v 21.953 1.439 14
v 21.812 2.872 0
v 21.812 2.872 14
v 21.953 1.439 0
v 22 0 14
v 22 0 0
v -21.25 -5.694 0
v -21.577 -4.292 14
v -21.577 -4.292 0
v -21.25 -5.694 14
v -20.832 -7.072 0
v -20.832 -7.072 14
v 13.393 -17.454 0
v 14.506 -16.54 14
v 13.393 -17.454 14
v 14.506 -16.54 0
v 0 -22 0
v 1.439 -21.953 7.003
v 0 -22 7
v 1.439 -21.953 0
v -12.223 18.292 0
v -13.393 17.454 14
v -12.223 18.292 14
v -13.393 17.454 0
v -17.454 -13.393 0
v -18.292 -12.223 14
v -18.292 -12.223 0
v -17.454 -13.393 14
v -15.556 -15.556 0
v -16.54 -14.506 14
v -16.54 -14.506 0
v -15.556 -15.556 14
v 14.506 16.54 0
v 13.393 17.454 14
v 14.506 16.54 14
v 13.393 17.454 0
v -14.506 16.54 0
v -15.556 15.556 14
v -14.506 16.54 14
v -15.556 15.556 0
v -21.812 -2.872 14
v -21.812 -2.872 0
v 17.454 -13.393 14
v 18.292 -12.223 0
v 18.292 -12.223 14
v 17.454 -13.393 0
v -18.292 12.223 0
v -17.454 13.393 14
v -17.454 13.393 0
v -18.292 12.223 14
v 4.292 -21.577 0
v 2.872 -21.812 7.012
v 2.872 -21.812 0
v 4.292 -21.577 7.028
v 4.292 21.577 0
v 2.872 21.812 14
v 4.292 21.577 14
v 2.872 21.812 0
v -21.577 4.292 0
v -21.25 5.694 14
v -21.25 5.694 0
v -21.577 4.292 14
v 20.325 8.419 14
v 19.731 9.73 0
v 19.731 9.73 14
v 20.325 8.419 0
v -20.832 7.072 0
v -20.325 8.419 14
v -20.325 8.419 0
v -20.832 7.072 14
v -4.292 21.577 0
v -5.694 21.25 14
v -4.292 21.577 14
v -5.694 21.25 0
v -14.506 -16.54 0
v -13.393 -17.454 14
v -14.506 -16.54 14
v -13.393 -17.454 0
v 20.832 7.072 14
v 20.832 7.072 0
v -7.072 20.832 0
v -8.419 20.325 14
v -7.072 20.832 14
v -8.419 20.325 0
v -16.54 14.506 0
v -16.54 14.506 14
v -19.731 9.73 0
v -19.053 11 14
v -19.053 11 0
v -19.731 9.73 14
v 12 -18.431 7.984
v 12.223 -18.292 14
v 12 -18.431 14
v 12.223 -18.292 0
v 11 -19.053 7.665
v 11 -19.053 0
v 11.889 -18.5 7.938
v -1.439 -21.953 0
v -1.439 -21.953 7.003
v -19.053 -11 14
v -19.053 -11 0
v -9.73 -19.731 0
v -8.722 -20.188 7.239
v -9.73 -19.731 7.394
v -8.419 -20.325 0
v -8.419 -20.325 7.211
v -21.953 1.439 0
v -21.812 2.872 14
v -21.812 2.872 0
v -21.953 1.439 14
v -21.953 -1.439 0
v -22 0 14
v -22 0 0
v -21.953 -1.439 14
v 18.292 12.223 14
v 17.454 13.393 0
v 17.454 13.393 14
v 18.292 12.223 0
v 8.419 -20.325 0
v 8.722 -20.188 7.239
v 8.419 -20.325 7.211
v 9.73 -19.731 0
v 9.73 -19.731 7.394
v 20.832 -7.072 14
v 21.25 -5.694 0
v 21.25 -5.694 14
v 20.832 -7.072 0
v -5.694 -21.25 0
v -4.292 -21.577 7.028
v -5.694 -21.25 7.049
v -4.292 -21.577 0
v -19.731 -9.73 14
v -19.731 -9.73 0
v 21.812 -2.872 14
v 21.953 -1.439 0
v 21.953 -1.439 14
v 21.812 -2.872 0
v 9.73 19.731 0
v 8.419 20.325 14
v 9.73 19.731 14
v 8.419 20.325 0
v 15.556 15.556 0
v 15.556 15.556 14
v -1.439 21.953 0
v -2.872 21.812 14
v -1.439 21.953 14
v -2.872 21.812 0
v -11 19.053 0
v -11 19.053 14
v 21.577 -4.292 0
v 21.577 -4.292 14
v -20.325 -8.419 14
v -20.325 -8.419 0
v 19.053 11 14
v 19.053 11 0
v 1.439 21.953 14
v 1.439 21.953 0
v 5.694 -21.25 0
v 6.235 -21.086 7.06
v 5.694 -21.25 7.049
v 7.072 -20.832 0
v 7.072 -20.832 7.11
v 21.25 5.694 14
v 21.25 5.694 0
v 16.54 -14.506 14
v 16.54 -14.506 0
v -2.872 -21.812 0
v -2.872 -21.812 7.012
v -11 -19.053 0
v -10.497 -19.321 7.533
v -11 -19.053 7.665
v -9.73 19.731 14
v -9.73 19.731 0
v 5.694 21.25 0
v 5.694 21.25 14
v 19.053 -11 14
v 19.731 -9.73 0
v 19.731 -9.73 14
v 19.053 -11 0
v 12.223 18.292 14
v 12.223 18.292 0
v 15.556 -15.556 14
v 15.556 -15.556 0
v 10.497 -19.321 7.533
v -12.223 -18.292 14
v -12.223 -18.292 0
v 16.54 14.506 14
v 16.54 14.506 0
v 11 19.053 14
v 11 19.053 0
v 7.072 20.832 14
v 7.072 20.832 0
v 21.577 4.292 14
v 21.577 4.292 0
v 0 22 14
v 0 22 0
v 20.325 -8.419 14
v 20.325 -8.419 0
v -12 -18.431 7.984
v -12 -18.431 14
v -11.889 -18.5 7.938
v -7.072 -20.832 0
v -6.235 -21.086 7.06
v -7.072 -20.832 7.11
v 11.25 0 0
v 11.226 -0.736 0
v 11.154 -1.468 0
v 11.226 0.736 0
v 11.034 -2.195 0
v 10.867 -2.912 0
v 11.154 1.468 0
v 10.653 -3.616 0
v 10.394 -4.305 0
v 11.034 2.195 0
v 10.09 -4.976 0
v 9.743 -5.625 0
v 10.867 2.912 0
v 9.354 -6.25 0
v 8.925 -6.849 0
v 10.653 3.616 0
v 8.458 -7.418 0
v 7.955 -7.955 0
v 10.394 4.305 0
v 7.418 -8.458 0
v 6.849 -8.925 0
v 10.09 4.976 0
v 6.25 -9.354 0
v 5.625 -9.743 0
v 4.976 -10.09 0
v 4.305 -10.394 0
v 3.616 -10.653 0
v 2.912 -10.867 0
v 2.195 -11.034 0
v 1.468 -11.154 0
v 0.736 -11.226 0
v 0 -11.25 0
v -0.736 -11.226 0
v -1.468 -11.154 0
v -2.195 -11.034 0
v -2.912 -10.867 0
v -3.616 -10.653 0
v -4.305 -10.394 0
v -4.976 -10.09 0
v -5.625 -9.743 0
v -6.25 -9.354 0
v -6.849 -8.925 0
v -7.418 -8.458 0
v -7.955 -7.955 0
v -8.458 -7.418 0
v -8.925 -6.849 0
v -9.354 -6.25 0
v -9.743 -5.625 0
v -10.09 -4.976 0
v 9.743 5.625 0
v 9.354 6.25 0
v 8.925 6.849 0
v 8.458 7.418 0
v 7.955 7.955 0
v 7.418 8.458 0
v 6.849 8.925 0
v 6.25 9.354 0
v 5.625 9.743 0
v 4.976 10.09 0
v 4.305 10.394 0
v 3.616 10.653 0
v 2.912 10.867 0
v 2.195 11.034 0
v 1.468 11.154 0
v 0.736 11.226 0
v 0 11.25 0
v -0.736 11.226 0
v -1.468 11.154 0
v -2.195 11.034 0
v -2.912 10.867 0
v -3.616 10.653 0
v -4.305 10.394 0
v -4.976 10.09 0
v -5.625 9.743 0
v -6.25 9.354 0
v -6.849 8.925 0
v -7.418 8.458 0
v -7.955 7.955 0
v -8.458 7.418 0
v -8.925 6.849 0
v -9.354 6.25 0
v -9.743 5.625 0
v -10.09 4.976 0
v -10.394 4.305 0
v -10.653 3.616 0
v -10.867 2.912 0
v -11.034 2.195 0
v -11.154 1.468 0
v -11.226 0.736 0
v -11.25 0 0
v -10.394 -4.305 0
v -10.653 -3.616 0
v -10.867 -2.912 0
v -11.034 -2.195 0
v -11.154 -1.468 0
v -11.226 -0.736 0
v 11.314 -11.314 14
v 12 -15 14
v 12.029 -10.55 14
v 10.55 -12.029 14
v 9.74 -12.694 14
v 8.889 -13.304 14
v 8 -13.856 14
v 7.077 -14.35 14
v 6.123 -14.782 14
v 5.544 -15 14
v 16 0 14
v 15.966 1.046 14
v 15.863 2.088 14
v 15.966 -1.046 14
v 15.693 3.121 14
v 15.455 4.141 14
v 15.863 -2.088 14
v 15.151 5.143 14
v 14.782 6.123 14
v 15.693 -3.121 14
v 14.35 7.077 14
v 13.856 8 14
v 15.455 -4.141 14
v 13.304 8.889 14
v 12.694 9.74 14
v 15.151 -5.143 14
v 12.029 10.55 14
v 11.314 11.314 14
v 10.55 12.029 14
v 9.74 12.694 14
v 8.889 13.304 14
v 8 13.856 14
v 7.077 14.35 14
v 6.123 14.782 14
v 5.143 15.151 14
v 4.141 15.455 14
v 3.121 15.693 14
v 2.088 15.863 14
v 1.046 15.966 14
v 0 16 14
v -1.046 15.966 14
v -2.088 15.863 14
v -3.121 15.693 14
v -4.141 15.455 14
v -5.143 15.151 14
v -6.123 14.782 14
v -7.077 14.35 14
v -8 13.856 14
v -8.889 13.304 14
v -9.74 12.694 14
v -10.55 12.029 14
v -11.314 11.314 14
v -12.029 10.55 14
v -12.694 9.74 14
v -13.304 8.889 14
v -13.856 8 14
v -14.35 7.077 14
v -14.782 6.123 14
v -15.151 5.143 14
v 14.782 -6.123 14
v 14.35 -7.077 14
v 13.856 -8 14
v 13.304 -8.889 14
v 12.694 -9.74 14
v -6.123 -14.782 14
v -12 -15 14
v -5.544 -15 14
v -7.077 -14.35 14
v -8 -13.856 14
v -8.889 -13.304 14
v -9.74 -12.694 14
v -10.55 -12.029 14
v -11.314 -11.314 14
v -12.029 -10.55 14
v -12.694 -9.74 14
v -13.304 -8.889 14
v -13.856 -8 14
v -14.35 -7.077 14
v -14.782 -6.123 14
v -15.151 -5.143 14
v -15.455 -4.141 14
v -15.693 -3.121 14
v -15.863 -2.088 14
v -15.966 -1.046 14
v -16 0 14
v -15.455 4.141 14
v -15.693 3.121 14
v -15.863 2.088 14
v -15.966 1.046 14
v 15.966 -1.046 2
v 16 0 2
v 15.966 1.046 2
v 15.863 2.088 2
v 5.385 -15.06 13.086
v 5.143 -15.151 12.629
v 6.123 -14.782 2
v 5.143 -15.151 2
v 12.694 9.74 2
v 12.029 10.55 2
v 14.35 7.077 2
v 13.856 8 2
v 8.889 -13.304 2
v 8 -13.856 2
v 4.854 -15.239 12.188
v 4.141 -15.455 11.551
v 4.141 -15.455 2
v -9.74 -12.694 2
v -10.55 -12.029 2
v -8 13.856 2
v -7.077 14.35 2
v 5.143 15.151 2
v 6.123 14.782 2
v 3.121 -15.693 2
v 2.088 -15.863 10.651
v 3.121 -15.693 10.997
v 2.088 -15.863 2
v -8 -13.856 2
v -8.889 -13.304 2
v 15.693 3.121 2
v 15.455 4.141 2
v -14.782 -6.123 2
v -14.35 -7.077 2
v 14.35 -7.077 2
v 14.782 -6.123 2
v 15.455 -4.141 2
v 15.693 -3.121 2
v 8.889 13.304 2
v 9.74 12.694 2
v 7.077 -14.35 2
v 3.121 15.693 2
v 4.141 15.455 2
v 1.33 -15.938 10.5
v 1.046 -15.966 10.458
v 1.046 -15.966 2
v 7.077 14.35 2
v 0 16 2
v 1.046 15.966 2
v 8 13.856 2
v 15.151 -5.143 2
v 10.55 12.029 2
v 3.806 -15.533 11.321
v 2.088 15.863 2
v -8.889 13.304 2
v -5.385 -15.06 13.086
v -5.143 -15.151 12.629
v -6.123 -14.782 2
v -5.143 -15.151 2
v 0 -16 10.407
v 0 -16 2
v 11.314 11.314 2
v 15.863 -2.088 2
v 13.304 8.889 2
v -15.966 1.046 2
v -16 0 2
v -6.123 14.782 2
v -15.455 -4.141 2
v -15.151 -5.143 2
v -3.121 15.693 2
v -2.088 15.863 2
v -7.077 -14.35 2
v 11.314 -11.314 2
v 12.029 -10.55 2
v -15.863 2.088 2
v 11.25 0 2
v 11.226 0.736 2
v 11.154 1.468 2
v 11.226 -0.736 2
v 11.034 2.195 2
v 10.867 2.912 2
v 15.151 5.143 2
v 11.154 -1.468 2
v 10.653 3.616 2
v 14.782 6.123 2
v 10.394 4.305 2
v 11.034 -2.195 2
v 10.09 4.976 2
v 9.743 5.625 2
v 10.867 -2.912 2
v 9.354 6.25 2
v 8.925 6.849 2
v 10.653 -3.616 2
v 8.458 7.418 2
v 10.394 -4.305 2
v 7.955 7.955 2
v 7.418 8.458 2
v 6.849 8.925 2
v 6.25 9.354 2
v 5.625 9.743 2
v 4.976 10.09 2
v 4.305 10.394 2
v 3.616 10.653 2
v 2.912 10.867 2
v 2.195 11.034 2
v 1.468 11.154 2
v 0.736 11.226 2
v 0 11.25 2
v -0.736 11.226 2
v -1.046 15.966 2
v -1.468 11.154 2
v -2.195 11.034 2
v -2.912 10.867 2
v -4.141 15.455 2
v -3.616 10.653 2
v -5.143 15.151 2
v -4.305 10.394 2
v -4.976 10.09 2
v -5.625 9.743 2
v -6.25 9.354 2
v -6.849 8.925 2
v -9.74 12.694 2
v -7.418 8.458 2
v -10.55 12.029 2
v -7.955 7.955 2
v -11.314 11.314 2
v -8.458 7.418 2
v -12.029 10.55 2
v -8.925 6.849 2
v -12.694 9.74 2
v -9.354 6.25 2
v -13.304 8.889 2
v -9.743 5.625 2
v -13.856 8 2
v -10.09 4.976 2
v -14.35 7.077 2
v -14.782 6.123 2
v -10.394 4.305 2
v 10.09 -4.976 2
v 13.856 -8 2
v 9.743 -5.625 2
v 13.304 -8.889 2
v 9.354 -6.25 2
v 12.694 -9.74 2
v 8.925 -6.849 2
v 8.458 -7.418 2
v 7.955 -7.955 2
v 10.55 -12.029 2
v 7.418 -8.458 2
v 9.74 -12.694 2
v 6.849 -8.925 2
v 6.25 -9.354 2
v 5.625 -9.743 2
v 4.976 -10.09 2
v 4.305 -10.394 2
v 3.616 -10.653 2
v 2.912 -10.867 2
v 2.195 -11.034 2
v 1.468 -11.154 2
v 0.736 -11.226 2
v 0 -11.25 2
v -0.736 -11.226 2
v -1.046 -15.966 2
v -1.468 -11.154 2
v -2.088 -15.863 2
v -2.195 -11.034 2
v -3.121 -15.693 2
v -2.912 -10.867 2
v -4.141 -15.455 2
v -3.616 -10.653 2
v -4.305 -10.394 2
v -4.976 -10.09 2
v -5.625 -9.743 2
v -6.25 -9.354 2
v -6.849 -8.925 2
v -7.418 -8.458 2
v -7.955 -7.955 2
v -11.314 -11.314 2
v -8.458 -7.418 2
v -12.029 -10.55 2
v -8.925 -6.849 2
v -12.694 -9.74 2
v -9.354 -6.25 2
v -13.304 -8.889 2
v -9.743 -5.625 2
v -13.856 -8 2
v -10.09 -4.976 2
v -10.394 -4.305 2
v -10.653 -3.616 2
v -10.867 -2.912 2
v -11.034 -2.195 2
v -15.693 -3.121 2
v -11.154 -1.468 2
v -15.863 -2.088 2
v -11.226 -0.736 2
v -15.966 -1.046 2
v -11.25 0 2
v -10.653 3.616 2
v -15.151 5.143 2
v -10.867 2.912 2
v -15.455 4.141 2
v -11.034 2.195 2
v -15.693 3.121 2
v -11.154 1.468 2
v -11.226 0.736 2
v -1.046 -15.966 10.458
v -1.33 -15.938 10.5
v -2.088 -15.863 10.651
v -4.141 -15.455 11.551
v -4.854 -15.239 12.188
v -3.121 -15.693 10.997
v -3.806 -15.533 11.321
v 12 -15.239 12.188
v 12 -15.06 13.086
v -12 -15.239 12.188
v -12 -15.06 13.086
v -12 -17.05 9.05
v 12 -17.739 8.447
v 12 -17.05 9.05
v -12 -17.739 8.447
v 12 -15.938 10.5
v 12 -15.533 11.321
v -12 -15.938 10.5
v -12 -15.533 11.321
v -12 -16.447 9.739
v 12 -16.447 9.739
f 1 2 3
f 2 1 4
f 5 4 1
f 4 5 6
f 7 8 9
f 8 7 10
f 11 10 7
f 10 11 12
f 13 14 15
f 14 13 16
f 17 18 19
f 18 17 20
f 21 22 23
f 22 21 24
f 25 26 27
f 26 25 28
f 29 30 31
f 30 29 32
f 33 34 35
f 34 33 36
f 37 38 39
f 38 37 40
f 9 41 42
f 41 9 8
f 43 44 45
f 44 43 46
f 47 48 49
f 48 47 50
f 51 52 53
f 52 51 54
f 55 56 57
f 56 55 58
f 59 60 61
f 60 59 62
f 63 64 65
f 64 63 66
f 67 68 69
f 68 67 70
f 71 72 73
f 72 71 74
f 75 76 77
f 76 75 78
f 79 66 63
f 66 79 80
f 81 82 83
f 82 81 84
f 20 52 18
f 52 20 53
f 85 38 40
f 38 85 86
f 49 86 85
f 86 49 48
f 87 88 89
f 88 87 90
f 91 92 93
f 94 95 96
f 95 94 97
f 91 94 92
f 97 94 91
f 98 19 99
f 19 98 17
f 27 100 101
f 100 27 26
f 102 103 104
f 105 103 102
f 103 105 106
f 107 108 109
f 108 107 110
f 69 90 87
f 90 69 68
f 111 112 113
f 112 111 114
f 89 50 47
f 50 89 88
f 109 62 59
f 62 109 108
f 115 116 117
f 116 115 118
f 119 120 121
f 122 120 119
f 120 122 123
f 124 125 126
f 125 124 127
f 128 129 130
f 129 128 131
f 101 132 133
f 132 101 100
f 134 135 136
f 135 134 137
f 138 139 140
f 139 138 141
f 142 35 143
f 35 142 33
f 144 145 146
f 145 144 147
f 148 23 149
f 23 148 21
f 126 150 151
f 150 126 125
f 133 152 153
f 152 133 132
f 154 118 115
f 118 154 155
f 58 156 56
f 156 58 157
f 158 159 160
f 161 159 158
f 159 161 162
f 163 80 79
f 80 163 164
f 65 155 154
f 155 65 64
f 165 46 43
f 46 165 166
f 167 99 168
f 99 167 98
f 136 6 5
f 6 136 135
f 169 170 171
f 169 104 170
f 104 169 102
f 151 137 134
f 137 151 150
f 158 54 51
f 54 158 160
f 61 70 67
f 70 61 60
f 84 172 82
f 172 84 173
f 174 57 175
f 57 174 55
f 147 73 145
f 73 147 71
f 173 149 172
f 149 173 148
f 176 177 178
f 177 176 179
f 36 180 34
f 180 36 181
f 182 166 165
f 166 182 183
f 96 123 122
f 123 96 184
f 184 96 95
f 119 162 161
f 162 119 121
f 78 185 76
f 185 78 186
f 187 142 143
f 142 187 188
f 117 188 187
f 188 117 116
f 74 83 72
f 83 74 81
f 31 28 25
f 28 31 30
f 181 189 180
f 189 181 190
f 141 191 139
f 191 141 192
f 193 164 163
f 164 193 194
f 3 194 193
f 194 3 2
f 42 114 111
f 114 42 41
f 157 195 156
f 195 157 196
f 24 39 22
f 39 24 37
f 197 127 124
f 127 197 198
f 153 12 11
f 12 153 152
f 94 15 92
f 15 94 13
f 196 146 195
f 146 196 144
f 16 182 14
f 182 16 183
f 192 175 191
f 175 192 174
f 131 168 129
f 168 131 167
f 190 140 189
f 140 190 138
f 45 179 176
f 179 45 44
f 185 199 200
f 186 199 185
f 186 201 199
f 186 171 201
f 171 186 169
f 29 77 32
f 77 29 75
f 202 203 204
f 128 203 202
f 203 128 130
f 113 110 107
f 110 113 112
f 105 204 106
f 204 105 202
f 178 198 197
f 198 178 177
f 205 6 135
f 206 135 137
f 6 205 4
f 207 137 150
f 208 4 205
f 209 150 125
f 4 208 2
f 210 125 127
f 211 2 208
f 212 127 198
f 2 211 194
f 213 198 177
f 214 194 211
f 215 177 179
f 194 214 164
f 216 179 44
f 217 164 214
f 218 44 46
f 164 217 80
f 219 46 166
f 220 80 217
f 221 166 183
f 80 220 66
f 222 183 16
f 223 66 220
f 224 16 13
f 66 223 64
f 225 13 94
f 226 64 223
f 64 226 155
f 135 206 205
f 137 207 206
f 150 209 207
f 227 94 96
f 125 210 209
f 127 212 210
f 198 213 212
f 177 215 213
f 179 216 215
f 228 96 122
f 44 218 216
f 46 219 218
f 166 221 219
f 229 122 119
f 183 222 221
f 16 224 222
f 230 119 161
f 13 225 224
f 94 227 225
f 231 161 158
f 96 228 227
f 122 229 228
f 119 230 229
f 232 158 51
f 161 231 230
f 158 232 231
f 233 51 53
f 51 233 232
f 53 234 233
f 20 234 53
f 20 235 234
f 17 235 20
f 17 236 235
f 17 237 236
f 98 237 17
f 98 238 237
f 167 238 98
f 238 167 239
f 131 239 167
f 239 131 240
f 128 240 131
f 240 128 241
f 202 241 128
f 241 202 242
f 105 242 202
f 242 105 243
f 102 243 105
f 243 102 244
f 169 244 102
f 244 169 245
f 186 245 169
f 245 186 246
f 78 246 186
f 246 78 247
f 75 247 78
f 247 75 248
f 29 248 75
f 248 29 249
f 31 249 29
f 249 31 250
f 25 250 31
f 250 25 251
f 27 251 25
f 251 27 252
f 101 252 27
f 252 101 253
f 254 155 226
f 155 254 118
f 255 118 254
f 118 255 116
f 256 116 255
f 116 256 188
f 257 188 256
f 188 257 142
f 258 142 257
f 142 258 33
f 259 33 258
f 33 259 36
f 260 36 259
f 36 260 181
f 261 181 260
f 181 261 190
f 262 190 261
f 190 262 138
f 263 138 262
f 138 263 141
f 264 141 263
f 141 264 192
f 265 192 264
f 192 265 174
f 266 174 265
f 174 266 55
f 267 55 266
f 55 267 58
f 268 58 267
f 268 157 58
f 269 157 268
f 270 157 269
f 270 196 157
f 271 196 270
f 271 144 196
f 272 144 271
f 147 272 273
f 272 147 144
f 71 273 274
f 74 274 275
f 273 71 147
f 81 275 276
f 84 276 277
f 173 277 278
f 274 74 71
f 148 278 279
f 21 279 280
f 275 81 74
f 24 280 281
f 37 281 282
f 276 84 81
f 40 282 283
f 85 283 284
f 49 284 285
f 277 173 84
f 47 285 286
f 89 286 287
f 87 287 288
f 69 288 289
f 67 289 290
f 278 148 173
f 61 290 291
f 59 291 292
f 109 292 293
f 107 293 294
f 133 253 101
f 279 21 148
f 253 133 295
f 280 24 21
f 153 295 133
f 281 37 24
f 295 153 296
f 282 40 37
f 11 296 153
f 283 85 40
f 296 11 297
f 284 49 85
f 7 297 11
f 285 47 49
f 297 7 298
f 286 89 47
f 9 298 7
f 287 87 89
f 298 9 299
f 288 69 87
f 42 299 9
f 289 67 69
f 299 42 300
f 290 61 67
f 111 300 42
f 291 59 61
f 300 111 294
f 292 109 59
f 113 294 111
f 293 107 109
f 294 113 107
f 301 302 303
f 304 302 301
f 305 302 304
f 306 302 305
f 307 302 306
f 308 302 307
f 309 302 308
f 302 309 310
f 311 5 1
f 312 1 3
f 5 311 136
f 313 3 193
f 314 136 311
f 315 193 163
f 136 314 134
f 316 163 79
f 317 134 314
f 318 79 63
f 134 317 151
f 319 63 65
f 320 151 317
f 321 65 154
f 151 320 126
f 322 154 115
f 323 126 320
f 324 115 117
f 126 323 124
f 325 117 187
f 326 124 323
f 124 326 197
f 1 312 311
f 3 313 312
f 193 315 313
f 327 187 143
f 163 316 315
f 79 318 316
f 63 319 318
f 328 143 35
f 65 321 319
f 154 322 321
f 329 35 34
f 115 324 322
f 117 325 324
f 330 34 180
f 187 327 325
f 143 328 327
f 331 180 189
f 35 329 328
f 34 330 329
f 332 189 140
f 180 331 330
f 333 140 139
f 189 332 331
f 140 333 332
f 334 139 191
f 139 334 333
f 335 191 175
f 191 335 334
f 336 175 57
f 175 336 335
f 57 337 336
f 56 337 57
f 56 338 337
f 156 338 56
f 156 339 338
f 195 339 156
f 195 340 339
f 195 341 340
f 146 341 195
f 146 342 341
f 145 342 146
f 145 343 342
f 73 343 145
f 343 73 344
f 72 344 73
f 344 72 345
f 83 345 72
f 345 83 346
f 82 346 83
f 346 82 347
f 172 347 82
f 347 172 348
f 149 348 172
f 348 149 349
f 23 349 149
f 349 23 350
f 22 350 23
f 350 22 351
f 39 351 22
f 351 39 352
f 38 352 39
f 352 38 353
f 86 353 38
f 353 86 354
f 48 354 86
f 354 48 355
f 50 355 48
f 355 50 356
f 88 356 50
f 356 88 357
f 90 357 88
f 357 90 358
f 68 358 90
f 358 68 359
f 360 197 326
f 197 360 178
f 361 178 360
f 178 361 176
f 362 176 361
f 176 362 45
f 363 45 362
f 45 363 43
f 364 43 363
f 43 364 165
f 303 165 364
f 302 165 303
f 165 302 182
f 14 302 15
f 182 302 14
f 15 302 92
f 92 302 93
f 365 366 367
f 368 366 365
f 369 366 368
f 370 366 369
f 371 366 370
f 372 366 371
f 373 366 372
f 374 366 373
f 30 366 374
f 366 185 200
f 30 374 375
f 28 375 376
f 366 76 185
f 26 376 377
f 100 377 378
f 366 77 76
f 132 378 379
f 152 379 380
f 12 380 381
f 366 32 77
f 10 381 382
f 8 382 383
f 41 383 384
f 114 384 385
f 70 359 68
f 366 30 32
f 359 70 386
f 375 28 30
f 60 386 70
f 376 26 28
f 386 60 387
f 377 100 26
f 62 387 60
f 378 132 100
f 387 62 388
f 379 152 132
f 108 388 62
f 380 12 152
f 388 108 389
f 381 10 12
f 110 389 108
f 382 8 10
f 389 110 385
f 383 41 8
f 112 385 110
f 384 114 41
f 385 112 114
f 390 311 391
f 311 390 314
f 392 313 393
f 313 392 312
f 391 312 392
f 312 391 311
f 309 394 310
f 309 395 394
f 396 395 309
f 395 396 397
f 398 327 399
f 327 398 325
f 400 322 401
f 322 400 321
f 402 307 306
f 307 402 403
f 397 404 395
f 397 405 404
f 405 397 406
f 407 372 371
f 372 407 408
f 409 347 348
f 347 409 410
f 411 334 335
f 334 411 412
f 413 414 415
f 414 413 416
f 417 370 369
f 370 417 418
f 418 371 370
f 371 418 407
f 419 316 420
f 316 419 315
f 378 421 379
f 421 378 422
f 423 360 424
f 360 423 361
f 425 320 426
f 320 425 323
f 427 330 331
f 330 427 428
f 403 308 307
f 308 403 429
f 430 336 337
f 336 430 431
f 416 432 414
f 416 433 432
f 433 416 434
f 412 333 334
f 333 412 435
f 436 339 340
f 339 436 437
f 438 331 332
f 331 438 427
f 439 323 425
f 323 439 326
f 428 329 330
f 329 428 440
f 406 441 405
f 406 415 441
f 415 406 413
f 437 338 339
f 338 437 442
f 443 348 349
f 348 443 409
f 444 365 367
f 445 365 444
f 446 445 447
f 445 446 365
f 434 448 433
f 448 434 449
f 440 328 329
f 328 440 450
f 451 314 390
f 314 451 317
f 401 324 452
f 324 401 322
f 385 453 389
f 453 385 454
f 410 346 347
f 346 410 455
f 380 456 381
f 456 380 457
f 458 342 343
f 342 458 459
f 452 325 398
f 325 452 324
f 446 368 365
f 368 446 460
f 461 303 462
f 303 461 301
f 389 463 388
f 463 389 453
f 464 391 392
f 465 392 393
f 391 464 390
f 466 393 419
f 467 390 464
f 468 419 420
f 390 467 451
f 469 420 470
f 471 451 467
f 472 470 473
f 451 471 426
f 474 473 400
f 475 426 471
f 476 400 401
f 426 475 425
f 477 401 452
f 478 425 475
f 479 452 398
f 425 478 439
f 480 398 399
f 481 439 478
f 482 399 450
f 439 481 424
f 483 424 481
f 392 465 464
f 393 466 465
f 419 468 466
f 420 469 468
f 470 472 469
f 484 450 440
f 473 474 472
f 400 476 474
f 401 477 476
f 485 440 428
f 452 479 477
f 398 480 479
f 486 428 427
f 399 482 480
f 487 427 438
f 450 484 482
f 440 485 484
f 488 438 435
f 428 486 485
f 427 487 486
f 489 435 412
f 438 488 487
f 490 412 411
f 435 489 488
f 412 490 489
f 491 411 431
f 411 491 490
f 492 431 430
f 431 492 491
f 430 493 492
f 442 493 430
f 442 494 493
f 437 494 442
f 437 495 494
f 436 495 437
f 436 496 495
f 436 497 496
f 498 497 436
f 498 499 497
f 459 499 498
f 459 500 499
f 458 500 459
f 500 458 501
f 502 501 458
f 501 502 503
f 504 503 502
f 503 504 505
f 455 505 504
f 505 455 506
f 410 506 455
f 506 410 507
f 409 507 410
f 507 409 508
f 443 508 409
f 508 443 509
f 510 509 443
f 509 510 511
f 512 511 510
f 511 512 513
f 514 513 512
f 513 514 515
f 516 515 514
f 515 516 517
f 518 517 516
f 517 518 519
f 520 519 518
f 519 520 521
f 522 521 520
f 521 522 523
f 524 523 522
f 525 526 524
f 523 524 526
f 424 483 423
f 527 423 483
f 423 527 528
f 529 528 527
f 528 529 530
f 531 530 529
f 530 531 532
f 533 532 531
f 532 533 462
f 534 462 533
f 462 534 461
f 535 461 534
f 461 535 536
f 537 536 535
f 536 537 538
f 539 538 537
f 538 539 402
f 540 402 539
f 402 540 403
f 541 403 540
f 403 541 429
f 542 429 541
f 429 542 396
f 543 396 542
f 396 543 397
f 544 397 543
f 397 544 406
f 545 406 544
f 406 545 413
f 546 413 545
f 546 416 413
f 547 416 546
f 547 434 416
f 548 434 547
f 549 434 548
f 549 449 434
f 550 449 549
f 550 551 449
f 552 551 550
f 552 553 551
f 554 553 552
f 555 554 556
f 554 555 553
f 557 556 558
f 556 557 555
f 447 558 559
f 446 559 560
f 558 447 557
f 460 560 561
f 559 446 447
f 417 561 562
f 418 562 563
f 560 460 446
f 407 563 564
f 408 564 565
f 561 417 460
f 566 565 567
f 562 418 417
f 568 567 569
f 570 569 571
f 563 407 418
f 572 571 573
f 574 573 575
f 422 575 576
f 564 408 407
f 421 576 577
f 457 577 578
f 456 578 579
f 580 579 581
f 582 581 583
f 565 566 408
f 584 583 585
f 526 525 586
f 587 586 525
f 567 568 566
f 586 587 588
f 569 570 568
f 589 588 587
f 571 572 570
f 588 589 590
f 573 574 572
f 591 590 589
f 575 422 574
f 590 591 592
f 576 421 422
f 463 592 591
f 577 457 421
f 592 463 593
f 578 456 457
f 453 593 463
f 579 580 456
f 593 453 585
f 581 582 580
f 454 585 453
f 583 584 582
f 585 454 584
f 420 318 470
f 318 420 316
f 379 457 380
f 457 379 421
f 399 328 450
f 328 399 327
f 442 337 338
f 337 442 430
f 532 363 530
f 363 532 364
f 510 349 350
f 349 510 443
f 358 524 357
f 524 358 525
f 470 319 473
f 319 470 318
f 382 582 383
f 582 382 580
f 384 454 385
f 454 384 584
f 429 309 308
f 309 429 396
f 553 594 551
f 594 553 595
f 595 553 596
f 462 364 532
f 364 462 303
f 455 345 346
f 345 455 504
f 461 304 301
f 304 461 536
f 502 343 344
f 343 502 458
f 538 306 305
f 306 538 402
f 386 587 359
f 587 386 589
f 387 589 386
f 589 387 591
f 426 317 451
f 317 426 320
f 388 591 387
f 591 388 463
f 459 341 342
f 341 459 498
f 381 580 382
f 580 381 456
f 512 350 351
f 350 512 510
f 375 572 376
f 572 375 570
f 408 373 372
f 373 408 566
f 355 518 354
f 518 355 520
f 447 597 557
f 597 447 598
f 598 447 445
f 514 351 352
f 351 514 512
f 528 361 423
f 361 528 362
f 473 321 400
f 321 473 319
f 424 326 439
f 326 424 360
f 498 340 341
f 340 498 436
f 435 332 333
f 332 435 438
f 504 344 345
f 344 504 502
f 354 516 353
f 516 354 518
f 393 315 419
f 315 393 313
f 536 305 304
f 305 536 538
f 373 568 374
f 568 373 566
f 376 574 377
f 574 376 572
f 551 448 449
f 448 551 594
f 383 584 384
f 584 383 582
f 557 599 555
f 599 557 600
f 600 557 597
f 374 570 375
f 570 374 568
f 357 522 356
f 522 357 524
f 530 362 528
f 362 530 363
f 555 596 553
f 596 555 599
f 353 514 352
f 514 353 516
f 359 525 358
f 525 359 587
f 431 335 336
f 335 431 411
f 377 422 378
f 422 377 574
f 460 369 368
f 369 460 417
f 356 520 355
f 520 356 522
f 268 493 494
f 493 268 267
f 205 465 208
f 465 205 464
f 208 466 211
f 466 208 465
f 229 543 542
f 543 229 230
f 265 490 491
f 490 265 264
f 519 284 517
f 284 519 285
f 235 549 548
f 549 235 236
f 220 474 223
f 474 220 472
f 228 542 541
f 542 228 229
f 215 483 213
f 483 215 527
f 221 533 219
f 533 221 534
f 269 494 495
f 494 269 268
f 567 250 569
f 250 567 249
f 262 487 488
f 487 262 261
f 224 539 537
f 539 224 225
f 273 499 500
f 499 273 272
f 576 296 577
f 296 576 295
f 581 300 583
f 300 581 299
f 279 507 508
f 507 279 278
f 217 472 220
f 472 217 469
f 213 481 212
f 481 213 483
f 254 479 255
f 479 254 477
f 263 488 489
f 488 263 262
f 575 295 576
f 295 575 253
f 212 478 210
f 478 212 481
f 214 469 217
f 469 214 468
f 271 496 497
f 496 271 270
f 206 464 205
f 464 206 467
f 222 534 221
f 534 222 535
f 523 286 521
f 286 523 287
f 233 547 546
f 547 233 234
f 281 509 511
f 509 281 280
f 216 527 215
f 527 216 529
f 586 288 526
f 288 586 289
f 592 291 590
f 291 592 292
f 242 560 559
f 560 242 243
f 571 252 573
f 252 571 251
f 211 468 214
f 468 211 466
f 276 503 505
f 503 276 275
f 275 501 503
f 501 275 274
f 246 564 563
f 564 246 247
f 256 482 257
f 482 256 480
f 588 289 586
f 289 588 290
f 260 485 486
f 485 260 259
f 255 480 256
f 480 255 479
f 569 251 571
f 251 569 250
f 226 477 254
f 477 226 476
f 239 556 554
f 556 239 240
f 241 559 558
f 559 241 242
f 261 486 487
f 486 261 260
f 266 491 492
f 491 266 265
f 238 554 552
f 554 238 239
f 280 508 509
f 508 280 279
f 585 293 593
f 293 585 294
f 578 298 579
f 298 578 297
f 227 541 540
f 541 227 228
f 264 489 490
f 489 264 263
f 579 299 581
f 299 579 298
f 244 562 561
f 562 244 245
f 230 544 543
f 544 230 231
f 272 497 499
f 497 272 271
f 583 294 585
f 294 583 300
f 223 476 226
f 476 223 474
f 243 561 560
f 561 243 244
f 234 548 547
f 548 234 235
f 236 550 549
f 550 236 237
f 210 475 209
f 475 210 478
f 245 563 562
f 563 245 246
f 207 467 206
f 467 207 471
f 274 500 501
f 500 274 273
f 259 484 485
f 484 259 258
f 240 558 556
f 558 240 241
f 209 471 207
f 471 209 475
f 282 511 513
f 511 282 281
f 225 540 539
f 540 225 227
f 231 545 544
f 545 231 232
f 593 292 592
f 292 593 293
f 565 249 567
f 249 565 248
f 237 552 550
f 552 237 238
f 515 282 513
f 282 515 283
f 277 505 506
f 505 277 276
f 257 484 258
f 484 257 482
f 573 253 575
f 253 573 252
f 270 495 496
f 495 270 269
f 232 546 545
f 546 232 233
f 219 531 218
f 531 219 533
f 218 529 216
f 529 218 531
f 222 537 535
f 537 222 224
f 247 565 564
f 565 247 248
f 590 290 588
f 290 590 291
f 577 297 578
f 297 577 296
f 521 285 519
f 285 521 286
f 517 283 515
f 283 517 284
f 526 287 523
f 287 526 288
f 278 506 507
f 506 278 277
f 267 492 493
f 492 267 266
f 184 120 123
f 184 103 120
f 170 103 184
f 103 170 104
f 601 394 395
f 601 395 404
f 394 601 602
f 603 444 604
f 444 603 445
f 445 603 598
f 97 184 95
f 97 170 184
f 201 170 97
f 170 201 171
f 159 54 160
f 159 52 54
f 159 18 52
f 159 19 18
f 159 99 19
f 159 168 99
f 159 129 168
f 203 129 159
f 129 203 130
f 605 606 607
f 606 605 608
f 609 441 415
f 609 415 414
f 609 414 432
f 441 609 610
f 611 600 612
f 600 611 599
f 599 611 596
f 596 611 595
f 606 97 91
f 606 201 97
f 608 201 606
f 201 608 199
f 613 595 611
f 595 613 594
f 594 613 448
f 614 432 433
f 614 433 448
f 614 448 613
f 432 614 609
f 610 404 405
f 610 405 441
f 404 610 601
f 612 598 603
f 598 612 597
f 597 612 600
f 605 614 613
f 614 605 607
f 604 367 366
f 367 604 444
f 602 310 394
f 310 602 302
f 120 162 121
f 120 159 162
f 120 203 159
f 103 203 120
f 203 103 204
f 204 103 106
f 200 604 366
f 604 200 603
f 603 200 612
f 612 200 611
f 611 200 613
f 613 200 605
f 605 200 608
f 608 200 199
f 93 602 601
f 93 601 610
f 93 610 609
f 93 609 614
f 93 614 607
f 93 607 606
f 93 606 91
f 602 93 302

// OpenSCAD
// Raised collar for the 22 mm JUMP ENGAGE button (stops accidental hyperspace).
// Clamped under the button's front nut; a finger notch faces the Ops seat.
include <../lib/ff_lib.scad>
PART = "collar";
H = 14; OD = 44; ID = 32;
difference() {
  union() {
    cylinder(d = OD, h = 2, $fn = 96);
    cylinder(d = OD, h = H, $fn = 96);
  }
  translate([0, 0, 2]) cylinder(d = ID, h = H, $fn = 96);
  translate([0, 0, -1]) cylinder(d = 22 + FF_HOLE_COMP + 0.3, h = 5, $fn = 96);
  // finger notch
  translate([0, -OD/2, H]) rotate([0, 90, 0]) cylinder(r = 7, h = 24, center = true, $fn = 48);
}
